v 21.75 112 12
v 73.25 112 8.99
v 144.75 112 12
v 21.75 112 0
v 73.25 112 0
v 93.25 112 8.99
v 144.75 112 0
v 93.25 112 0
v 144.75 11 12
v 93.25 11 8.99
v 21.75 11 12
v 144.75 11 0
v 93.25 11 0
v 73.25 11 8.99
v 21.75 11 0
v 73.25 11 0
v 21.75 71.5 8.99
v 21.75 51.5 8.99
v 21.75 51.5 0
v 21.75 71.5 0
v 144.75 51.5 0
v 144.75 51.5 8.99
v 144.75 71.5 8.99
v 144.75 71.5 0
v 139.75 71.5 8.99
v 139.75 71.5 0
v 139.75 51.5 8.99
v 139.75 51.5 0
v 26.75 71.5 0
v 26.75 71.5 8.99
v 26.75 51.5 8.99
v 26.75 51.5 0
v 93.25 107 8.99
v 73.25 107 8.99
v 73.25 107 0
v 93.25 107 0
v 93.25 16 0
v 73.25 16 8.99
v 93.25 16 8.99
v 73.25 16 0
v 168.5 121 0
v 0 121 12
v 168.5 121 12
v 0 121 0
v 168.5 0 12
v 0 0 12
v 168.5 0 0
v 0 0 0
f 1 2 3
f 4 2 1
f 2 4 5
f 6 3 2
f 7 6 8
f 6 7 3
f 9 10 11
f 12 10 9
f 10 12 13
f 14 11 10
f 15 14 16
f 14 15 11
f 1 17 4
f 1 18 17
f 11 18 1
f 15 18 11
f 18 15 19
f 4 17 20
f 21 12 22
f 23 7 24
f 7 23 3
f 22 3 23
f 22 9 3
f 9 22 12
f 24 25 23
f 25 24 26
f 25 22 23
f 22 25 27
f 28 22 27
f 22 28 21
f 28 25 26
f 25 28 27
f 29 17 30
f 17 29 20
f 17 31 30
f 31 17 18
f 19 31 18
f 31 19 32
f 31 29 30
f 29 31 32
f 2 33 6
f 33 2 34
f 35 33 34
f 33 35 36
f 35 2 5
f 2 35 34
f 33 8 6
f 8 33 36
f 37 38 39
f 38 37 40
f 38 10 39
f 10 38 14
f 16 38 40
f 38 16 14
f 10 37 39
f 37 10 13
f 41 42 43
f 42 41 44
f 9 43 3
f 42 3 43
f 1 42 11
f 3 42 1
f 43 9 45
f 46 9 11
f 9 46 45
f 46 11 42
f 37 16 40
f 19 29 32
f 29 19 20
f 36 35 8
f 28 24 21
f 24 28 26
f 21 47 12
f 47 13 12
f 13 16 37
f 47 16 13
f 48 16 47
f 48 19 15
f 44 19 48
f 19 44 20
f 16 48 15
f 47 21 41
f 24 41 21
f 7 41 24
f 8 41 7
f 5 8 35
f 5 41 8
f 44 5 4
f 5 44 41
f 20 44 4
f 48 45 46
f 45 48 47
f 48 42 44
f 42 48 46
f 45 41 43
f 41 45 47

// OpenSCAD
$fa = 1;
$fs = 0.04;

e = 0.01;

// 4x5 Spring back

// 25mm == 1 inch
// 12mm == 1/2 inch
// 6mm == 1/4 inch
// 101.6mm = 4 inches
// 127mm == 5 inches

module ground_glass_tab_neg(
    depth
) {
    cube([20, 5, depth*3/4]);
}

module film_gate_hole(
    film_gate_height,
    film_gate_width,
    tab_height,
    tab_width,
    depth
) {
    height = film_gate_height+2;
    width = film_gate_width+2;

    difference () {
        cube([height, width, depth + (2* e)]);

        translate([height/2-10, 0, 0])
            cube([tab_height, tab_width, depth*3/4]);

        translate([(height/2)-10, width-5, 0])
            cube([tab_height, tab_width, depth*3/4]);

        translate([height-5, (width/2)-10, 0])
            cube([tab_width, tab_height, depth*3/4]);

        translate([0, (width/2)-10, 0])
            cube([tab_width, tab_height, depth*3/4]);
    }
}

module ground_glass(
    height,
    width,
    depth,
    film_gate_height,
    film_gate_width,
) {
    translate([width, 0,  0])
    rotate([0,0,90])
    difference() {
        // film holder cut out
        cube([height, width, depth]);

        // film gate hole
        translate([(height - film_gate_height)/2, (width - film_gate_width)/2, -e])
            film_gate_hole(film_gate_height, film_gate_width, 20, 5, depth);
    }


}

ground_glass(
    height = 121,
    width = 184-15.5,
    depth = 12,
    film_gate_height=99,
    film_gate_width=121
);
